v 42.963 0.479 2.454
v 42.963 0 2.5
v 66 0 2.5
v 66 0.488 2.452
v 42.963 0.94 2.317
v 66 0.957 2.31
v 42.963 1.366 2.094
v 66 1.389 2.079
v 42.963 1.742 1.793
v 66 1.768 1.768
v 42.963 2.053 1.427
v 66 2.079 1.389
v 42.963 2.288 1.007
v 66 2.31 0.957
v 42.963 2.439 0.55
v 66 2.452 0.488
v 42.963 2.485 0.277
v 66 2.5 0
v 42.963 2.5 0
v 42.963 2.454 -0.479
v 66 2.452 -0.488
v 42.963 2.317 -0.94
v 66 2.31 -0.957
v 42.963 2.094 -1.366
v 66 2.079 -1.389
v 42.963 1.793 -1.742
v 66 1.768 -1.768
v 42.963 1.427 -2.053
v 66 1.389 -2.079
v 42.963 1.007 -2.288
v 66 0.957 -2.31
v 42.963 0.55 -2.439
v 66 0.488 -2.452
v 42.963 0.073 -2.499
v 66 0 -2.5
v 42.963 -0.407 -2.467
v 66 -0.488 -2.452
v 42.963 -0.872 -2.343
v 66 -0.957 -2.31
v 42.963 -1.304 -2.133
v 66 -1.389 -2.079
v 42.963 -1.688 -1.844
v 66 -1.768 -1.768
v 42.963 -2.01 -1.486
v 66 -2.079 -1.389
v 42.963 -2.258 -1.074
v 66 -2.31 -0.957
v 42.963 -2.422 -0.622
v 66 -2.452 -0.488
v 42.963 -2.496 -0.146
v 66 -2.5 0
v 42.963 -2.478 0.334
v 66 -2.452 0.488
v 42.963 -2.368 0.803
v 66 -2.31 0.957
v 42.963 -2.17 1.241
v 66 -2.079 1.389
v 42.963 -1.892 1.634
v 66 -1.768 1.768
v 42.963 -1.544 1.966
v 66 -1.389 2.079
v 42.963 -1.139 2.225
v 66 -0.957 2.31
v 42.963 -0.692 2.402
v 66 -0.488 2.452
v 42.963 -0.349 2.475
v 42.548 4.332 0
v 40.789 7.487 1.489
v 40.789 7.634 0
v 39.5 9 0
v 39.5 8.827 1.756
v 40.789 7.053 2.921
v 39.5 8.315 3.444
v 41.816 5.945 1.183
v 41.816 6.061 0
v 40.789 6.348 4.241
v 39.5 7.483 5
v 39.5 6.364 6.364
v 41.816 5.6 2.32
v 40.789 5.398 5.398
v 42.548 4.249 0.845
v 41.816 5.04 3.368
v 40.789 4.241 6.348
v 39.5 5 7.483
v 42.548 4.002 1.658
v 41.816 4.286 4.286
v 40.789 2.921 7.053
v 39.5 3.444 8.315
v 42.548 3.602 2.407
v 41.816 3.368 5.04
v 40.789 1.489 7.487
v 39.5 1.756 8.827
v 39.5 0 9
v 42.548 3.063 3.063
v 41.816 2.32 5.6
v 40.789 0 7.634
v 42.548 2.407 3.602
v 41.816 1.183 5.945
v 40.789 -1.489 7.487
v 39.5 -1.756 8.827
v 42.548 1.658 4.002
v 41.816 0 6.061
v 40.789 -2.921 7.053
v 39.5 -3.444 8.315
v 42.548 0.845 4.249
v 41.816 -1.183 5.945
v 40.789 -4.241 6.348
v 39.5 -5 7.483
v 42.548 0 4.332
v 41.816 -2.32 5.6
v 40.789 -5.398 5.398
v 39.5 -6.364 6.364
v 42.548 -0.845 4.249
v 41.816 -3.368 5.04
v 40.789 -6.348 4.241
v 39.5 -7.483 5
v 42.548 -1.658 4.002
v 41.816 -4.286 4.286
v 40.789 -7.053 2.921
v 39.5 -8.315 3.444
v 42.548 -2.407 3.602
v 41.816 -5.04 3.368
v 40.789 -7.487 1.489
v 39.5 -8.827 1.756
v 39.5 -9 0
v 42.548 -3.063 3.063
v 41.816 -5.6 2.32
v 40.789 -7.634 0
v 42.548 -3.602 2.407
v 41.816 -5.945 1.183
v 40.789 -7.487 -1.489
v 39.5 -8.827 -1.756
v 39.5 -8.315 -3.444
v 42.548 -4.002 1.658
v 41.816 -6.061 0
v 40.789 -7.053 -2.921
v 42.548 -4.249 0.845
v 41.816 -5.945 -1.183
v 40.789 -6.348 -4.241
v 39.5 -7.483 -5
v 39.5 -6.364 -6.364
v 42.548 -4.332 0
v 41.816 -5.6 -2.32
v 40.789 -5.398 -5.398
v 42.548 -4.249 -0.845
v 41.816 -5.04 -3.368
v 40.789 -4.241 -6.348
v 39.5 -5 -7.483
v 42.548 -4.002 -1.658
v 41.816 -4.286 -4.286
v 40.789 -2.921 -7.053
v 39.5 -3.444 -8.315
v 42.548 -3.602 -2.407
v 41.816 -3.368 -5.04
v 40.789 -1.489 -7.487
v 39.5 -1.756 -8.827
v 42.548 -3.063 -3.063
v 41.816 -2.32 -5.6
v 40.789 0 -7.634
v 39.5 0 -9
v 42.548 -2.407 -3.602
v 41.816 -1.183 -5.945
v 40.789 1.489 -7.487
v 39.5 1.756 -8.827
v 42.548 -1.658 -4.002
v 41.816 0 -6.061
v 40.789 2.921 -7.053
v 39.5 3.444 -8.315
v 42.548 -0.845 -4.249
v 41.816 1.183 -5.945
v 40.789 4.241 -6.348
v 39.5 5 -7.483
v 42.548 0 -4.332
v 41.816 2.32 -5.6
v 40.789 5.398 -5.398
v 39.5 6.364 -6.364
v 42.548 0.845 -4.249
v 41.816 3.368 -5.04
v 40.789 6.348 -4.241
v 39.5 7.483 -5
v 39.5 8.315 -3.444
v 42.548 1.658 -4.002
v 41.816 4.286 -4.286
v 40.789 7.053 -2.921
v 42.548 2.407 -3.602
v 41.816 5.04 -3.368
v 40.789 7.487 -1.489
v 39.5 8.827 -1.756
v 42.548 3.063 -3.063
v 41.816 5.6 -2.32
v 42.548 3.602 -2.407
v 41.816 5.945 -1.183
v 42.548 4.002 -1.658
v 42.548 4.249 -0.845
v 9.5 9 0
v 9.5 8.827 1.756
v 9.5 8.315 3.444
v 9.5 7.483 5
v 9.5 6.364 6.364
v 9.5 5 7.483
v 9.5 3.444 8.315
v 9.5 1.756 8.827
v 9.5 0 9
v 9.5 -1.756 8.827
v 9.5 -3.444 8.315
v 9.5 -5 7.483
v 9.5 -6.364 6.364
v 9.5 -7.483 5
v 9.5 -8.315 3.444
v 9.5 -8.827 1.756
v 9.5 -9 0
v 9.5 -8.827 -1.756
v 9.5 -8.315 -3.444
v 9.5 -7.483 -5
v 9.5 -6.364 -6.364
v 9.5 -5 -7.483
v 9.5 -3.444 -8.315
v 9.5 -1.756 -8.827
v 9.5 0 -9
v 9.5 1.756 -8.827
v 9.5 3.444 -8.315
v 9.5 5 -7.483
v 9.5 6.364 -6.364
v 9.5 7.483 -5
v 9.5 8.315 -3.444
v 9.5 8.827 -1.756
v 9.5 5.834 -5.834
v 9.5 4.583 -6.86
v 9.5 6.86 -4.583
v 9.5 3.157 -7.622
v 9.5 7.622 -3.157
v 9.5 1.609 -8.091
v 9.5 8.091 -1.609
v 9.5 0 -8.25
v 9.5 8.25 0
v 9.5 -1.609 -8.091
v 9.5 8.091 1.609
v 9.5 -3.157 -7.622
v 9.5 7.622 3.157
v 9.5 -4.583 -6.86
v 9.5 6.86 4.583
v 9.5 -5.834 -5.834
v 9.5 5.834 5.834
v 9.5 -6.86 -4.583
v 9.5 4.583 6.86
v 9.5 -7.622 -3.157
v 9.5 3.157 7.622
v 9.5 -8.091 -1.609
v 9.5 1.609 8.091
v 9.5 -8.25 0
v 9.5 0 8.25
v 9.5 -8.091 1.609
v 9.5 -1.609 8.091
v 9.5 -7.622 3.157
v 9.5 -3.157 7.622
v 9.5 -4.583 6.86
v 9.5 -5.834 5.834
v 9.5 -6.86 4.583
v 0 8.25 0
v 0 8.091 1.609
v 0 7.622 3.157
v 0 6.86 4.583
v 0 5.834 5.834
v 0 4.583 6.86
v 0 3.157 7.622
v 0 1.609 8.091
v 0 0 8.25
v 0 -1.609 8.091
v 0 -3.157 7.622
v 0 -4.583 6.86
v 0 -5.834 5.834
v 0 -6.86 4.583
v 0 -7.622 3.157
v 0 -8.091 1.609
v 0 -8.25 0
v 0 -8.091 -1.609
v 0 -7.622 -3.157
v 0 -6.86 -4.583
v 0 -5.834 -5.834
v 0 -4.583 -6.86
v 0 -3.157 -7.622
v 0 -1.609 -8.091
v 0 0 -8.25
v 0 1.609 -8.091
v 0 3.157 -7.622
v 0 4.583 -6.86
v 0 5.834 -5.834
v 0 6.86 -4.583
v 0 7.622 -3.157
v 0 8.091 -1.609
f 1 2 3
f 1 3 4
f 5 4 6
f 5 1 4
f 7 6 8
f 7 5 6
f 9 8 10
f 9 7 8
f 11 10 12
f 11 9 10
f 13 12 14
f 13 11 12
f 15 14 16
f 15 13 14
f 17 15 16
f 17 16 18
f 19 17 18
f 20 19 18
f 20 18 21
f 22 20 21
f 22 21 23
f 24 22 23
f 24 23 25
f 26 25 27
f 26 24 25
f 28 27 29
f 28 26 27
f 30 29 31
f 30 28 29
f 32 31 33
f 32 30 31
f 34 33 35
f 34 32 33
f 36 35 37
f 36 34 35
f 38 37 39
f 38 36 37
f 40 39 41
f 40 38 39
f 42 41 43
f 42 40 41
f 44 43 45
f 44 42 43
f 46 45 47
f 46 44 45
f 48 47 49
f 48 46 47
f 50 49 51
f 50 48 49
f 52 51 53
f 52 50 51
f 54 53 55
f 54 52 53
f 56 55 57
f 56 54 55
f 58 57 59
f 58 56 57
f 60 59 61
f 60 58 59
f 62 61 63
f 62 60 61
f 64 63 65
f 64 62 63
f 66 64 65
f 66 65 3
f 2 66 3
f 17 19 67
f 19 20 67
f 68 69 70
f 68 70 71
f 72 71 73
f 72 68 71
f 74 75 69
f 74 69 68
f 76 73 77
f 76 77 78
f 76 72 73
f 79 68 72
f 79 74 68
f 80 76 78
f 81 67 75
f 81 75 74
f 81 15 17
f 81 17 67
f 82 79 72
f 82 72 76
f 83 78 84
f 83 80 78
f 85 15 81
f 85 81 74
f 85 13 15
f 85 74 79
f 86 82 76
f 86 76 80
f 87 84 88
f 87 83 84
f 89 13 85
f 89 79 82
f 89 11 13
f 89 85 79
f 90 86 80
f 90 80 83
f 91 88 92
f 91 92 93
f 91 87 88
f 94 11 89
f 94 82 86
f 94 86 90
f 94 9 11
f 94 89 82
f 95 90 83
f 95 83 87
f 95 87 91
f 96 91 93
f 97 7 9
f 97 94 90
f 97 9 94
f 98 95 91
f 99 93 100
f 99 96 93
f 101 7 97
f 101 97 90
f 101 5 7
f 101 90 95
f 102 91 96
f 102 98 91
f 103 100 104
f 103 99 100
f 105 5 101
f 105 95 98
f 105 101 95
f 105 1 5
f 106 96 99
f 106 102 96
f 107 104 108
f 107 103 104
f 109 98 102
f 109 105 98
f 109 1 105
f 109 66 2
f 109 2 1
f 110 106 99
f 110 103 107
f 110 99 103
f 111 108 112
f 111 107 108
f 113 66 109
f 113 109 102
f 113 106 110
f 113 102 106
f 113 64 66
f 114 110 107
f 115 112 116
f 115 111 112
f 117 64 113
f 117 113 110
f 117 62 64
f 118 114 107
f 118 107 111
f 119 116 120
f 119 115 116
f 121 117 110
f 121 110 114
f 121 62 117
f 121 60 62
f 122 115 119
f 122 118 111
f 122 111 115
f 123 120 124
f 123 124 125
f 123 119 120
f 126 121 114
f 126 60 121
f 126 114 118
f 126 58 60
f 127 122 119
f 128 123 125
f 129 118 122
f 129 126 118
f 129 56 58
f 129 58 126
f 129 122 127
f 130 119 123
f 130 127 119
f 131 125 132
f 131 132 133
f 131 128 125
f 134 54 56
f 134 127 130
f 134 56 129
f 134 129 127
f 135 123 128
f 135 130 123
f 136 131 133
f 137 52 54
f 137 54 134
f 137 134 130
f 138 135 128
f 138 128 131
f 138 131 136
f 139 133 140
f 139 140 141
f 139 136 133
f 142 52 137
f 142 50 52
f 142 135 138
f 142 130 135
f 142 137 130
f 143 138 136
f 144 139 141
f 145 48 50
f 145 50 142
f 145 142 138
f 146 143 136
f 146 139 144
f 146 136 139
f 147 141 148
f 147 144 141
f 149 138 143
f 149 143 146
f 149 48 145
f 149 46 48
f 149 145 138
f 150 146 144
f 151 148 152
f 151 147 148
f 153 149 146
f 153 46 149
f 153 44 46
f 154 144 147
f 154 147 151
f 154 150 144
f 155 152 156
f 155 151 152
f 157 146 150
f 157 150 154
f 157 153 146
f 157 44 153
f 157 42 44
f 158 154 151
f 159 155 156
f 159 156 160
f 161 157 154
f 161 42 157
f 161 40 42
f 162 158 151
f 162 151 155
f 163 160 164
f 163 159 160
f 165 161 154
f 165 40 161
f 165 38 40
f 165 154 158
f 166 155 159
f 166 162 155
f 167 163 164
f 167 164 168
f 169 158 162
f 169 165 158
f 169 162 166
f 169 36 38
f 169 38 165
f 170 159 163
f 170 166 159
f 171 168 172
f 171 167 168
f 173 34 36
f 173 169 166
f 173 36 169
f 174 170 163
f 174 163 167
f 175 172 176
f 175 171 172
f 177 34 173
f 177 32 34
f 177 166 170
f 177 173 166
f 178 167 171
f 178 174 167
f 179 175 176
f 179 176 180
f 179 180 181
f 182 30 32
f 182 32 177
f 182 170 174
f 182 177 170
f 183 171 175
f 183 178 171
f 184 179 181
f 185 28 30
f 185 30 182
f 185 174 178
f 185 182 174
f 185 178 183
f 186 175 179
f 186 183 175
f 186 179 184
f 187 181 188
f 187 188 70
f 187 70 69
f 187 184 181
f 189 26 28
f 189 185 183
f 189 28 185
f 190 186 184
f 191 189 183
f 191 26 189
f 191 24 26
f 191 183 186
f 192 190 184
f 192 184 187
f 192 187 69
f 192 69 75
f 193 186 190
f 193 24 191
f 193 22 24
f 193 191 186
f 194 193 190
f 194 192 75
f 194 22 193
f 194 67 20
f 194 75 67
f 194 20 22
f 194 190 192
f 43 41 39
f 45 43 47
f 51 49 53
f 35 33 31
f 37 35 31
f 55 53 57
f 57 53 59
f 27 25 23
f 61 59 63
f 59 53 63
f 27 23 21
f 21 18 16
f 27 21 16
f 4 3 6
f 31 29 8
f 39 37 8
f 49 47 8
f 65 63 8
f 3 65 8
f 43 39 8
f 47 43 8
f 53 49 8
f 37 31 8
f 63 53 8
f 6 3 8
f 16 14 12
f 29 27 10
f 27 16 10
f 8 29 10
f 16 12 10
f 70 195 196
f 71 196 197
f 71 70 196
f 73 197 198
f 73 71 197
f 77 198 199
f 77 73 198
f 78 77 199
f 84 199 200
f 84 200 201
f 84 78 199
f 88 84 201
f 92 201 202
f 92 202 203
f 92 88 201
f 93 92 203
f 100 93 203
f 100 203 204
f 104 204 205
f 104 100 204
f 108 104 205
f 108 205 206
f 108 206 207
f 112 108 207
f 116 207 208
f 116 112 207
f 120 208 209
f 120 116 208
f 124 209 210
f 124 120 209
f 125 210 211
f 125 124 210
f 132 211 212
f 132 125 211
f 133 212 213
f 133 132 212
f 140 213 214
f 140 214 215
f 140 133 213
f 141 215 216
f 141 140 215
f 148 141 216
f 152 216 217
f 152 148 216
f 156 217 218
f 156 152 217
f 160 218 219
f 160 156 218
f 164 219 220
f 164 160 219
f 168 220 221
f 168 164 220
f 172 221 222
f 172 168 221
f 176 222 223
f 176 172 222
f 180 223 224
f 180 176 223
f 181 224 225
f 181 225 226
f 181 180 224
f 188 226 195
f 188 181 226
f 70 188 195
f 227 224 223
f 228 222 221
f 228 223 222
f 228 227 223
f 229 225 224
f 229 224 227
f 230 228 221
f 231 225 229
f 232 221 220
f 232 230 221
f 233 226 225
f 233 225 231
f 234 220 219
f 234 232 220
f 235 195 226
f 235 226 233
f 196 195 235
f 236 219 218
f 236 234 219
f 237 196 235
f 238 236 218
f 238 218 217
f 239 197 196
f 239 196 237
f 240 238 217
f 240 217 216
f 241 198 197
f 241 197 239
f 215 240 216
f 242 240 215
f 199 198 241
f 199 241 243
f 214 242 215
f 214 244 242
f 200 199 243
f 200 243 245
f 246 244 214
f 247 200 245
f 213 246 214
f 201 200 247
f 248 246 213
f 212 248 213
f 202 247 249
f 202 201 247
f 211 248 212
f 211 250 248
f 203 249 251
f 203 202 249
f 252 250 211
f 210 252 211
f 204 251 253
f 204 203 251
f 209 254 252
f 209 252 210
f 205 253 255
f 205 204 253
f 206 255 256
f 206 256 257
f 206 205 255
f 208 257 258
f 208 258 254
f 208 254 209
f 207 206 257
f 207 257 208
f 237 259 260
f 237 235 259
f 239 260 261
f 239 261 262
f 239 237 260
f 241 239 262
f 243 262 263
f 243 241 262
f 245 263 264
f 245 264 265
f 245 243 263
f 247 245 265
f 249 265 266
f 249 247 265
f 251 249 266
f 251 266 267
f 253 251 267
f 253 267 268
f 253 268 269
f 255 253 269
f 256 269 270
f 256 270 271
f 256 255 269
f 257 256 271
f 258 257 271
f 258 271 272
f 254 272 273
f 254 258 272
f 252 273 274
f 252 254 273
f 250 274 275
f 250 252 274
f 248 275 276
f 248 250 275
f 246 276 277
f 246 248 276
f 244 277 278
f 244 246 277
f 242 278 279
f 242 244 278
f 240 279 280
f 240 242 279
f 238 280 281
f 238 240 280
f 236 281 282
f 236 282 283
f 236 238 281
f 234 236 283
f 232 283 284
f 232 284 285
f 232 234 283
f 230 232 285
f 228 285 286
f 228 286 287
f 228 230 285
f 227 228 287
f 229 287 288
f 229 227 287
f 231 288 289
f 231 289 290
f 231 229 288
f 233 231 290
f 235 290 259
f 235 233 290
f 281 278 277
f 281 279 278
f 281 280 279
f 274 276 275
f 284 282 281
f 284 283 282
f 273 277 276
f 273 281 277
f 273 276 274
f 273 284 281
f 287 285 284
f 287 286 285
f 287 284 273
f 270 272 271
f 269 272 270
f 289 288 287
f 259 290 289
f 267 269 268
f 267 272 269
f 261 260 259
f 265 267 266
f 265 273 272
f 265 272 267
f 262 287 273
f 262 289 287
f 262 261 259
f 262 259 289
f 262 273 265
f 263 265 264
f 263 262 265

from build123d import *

# Parameters (mm, degrees)
SKETCH2_R           = 2.5
BOSS_EXTRUDE1_DEPTH = 66


with BuildPart() as part:
    # Sketch1 → Revolve1 (revolve)
    with BuildSketch(Plane.XY):
        with BuildLine():
            Line((0, 0), (0, 8.25))
            Line((0, 8.25), (9.5, 8.25))
            Line((9.5, 8.25), (9.5, 9))
            Line((9.5, 9), (39.5, 9))
            ThreePointArc((39.5, 9), (42.338390167, 4.923262843), (43, 0))
            Line((43, 0), (0, 0))
        make_face()
    revolve(axis=Axis((0, 0, 0), (1, 0, 0)))

    # Sketch2 → Boss-Extrude1 (add)
    with BuildSketch(Plane.ZY):
        Circle(SKETCH2_R)
    extrude(amount=-BOSS_EXTRUDE1_DEPTH)


solid = part.part
